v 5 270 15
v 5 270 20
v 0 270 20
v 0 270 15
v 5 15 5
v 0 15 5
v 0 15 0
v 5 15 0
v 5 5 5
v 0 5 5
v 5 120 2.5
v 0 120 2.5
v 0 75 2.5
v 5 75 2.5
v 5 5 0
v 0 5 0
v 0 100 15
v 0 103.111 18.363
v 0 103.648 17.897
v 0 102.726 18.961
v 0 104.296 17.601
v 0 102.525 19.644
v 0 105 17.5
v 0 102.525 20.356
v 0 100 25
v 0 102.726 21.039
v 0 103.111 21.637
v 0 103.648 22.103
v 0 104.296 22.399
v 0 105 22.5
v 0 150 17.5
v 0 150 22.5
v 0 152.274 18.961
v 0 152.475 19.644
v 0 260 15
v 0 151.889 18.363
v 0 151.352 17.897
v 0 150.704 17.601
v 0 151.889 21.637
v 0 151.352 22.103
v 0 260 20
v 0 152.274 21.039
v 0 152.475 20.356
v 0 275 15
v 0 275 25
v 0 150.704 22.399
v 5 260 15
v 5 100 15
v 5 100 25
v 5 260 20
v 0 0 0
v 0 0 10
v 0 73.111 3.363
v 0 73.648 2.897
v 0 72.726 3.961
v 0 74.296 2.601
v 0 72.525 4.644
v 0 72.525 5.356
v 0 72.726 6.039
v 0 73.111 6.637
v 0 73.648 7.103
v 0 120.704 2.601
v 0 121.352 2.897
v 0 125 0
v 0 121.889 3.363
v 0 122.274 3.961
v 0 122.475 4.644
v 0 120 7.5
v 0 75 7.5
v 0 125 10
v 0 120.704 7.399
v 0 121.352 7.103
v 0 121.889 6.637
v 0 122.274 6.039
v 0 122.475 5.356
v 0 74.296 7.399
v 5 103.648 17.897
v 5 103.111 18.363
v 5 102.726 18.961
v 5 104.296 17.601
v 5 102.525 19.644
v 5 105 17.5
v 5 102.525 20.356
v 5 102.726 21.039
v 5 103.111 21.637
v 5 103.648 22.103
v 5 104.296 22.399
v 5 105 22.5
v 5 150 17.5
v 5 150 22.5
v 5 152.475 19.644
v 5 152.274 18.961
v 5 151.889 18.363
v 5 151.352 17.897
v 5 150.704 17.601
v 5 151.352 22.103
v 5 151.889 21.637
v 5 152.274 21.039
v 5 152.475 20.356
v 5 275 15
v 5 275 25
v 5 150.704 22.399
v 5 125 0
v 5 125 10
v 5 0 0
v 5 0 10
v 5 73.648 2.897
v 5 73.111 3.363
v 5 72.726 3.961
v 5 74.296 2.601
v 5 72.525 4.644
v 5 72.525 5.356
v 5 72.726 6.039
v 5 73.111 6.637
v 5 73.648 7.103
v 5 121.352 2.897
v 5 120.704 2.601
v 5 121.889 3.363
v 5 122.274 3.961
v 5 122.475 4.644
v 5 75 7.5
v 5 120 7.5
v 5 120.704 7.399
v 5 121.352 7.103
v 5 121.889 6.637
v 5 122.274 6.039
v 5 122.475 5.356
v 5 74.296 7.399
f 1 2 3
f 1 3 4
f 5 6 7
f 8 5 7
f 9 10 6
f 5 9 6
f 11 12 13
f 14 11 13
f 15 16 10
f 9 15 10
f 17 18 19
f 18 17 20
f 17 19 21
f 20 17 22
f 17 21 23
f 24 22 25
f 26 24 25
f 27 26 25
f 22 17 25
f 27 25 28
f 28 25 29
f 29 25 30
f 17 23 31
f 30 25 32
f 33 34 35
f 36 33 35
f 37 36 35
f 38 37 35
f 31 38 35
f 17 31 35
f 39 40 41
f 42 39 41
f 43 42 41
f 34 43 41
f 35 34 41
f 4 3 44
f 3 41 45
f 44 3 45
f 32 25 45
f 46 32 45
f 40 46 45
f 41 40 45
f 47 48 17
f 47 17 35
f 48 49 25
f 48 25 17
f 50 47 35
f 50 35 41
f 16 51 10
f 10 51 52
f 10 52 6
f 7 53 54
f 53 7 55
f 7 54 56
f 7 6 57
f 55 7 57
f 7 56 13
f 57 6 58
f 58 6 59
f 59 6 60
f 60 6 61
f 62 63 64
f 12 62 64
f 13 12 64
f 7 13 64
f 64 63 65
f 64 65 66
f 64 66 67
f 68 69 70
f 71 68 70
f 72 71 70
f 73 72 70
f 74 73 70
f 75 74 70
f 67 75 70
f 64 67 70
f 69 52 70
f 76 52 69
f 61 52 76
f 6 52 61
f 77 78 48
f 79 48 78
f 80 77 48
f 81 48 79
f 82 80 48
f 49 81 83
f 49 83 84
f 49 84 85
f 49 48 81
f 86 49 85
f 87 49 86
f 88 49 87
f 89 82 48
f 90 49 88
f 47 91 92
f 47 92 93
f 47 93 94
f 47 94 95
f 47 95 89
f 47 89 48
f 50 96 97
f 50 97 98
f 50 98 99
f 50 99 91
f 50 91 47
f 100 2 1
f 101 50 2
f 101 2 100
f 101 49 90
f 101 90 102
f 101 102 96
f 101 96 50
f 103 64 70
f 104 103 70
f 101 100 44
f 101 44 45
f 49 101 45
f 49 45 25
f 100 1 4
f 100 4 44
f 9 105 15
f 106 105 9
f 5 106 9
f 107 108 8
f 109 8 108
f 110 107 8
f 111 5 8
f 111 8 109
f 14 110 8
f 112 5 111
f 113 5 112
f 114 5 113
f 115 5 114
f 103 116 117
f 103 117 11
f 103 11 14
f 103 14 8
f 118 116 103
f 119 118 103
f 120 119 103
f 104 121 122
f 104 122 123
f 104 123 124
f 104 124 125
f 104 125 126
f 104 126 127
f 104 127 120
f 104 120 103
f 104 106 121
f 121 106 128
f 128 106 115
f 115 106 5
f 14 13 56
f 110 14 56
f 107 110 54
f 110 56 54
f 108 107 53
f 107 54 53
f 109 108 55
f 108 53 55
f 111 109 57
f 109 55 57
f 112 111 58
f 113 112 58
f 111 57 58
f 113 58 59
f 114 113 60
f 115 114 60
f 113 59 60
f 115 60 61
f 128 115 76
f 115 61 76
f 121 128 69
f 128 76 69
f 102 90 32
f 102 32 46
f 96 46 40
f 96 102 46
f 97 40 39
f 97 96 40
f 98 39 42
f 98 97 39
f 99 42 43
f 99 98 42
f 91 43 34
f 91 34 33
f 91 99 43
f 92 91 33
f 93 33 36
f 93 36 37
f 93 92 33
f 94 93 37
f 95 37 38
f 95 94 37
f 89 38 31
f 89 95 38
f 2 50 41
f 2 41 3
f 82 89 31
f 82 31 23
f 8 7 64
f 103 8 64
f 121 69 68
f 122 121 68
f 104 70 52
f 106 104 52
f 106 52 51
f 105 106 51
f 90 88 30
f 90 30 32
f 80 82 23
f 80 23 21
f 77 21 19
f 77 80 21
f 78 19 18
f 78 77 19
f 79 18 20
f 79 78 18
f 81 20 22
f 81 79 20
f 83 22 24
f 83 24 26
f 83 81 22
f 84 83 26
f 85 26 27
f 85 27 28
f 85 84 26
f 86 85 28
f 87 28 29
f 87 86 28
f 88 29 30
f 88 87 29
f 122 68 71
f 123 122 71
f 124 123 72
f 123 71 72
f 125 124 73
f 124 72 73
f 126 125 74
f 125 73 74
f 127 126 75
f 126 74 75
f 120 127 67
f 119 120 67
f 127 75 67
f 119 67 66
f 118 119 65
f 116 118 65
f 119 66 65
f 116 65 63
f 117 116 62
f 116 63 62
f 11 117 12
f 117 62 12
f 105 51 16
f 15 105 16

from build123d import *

# Parameters (mm, degrees)
F1_DEPTH = 5
F3_DEPTH = 5


with BuildPart() as f1:
    # F0 (on Right) → F1 (new body)
    with BuildSketch(Plane.YZ):
        Polygon((15, 0), (125, 0), (125, 10), (0, 10), (0, 0), (5, 0), (5, 5), (15, 5), align=None)
        with BuildLine():
            ThreePointArc((120, 7.5), (122.5, 5), (120, 2.5))
            Line((120, 2.5), (75, 2.5))
            ThreePointArc((75, 2.5), (72.5, 5), (75, 7.5))
            Line((75, 7.5), (120, 7.5))
        make_face(mode=Mode.SUBTRACT)
    extrude(amount=F1_DEPTH)


with BuildPart() as f3:
    # F2 (on face) → F3 (new body)
    with BuildSketch(Plane.YZ.offset(5)):
        Polygon((100, 15), (260, 15), (260, 20), (270, 20), (270, 15), (275, 15), (275, 25), (100, 25), align=None)
        with BuildLine():
            ThreePointArc((105, 17.5), (102.5, 20), (105, 22.5))
            Line((105, 22.5), (150, 22.5))
            ThreePointArc((150, 22.5), (152.5, 20), (150, 17.5))
            Line((150, 17.5), (105, 17.5))
        make_face(mode=Mode.SUBTRACT)
    extrude(amount=-F3_DEPTH)


solid = Compound([f1.part, f3.part])
